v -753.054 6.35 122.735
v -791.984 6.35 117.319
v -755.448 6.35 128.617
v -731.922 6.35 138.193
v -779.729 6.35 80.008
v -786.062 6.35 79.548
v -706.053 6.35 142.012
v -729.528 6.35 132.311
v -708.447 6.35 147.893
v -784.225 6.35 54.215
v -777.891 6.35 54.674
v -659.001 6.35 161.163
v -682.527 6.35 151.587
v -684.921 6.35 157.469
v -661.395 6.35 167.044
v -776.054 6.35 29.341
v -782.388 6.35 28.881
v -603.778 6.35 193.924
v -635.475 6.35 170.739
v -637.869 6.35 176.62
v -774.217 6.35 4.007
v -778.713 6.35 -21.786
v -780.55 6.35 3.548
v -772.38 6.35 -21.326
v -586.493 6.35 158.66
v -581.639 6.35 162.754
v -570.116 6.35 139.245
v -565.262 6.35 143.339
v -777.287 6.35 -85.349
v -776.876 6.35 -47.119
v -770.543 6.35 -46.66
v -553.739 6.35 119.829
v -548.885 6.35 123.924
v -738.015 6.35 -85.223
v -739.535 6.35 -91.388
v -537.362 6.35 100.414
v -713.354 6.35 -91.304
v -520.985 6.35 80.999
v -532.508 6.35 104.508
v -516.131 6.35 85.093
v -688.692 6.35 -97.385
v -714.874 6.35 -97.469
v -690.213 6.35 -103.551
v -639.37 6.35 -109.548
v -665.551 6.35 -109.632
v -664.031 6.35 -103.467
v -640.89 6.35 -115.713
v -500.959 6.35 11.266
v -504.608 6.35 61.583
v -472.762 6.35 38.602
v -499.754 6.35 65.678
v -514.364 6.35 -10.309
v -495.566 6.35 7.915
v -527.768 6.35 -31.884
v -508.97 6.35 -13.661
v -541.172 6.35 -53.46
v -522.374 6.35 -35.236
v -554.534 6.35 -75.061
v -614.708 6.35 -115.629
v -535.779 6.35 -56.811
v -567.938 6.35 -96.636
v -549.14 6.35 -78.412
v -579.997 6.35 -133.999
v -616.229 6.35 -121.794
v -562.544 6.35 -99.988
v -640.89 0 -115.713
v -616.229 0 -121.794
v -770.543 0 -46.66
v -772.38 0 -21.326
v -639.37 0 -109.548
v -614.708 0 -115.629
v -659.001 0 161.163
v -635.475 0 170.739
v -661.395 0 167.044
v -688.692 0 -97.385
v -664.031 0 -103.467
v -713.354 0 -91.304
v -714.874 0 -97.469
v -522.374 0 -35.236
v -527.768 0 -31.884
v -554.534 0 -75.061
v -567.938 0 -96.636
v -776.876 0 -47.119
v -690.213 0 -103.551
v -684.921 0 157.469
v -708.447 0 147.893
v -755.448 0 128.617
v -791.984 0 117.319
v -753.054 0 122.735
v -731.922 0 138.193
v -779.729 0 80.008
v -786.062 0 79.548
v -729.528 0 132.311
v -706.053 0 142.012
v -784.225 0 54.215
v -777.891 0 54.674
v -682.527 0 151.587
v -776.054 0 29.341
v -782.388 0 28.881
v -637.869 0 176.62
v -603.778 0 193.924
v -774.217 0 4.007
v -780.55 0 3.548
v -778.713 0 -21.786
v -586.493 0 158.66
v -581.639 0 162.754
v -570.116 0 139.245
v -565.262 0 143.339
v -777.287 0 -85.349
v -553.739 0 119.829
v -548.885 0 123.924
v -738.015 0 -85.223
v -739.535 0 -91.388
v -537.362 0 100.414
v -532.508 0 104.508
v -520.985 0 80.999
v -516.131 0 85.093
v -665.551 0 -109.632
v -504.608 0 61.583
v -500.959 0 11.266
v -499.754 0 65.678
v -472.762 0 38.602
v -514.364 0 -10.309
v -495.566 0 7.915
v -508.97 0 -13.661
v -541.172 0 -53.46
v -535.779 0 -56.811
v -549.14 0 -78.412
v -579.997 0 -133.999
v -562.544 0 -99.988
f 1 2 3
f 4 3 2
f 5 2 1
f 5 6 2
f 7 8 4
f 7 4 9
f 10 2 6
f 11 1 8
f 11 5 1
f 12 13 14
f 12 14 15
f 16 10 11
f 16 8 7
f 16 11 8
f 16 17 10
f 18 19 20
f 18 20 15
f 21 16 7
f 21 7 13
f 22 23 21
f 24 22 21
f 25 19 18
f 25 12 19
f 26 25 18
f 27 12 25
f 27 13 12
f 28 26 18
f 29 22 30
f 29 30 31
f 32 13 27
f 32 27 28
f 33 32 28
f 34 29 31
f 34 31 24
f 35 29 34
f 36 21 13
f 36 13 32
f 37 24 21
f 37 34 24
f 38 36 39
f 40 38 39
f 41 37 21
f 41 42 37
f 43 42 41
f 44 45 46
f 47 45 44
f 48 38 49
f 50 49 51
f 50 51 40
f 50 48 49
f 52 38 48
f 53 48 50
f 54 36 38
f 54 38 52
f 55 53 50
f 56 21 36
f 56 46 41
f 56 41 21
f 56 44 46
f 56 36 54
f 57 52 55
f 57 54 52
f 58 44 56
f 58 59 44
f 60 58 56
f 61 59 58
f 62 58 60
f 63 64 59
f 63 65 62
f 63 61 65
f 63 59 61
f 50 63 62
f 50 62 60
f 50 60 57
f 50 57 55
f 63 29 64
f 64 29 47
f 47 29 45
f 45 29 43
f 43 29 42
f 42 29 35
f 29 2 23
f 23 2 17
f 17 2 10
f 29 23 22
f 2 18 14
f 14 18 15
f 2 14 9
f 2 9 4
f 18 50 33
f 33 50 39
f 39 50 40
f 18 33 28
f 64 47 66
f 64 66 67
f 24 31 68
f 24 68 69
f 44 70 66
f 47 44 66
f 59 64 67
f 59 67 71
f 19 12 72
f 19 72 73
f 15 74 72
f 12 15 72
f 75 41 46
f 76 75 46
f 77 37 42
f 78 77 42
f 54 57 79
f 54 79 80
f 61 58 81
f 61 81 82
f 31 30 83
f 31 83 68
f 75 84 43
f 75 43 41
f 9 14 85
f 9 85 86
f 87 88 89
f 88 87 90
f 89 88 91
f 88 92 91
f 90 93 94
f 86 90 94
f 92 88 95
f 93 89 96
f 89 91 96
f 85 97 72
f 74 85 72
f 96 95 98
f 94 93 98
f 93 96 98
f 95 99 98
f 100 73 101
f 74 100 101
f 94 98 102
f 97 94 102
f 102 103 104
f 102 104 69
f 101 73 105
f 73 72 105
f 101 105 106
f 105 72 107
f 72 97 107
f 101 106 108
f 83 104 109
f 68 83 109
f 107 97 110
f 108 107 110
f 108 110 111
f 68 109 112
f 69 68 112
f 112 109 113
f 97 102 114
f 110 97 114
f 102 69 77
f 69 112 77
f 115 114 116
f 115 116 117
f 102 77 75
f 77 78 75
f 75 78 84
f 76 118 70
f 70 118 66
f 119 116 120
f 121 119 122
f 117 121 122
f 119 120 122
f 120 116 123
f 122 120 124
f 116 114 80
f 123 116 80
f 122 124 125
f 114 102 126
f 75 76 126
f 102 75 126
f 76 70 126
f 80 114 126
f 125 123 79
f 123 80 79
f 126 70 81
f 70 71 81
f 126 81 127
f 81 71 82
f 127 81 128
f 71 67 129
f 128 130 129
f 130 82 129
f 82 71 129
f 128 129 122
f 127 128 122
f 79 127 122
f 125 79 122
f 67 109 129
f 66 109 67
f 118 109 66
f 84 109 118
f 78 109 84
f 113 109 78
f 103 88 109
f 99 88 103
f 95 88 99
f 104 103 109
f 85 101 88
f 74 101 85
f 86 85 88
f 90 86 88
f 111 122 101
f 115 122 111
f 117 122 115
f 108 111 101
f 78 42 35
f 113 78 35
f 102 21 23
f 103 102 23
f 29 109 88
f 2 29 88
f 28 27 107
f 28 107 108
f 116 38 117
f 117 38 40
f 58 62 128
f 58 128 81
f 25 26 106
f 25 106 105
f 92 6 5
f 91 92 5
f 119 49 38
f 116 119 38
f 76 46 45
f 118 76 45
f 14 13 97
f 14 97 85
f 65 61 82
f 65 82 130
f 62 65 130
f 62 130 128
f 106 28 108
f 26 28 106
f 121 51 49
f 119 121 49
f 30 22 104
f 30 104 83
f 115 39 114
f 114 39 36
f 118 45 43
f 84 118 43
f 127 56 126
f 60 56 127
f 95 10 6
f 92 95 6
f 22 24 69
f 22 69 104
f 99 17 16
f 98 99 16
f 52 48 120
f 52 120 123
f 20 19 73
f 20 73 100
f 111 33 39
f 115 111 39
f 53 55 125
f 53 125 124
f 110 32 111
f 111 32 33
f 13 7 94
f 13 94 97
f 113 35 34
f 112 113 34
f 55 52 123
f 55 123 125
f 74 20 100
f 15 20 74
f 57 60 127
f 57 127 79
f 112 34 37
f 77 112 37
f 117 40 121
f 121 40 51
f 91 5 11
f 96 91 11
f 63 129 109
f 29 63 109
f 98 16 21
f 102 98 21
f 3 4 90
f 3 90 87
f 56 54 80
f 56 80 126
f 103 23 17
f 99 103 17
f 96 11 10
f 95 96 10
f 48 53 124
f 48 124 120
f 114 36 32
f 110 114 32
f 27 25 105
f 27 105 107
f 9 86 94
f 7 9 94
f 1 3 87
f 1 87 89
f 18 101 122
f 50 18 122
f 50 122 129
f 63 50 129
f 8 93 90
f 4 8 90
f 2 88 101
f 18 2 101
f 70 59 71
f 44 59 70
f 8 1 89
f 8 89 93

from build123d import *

# Parameters (mm, degrees)
BOSS_EXTRUDE1_DEPTH = 6.35
CUT_EXTRUDE1_DEPTH  = 7.35
CUT_EXTRUDE2_DEPTH  = 7.35
CUT_EXTRUDE3_DEPTH  = 7.35
CUT_EXTRUDE4_DEPTH  = 7.35
CUT_EXTRUDE5_DEPTH  = 7.35


with BuildPart() as part:
    # Sketch1 → Boss-Extrude1 (new body)
    with BuildSketch(Plane(origin=(0, 0, 0), x_dir=(1, 0, 0), z_dir=(0, 1, 0))):
        Polygon((-472.762098838, -38.601599313), (-579.996957803, 133.998878735), (-777.287160977, 85.348948297), (-791.984353221, -117.318840313), (-603.777514393, -193.924491661), align=None)
    extrude(amount=BOSS_EXTRUDE1_DEPTH)

    # Sketch2 → Cut-Extrude1 (cut, through all)
    with BuildSketch(Plane(origin=(0, 6.35, 0), x_dir=(1, 0, 0), z_dir=(0, 1, 0))):
        Polygon((-659.001261619, -161.163030045), (-635.475406766, -170.738736463), (-637.86933337, -176.620200176), (-661.395188224, -167.044493758), align=None)
        Polygon((-706.052971326, -142.011617208), (-682.527116473, -151.587323626), (-684.921043077, -157.46878734), (-708.446897931, -147.893080921), align=None)
        Polygon((-753.053854552, -122.735332494), (-729.527999698, -132.311038913), (-731.921926303, -138.192502626), (-755.447781156, -128.616796208), align=None)
    extrude(amount=-CUT_EXTRUDE1_DEPTH, mode=Mode.SUBTRACT)

    # Sketch4 → Cut-Extrude2 (cut, through all)
    with BuildSketch(Plane(origin=(0, 6.35, 0), x_dir=(1, 0, 0), z_dir=(0, 1, 0))):
        Polygon((-570.115957611, -139.244740198), (-565.262117225, -143.338971934), (-581.639044169, -162.754333478), (-586.492884555, -158.660101741), align=None)
        Polygon((-520.985176778, -80.998655568), (-516.131336392, -85.092887304), (-499.754409447, -65.677525761), (-504.608249833, -61.583294024), align=None)
        Polygon((-548.88519028, -123.923610391), (-532.508263336, -104.508248847), (-537.362103722, -100.414017111), (-553.739030666, -119.829378655), align=None)
    extrude(amount=-CUT_EXTRUDE2_DEPTH, mode=Mode.SUBTRACT)

    # Sketch5 → Cut-Extrude3 (cut, through all)
    with BuildSketch(Plane(origin=(0, 6.35, 0), x_dir=(1, 0, 0), z_dir=(0, 1, 0))):
        Polygon((-777.891428053, -54.674087259), (-784.224796447, -54.214800001), (-786.061945478, -79.548273578), (-779.728577084, -80.007560835), align=None)
        Polygon((-774.217129992, -4.007140106), (-780.550498387, -3.547852849), (-782.387647417, -28.881326425), (-776.054279023, -29.340613683), align=None)
        Polygon((-776.876200326, 47.119094304), (-770.542831932, 46.659807046), (-772.379980962, 21.32633347), (-778.713349356, 21.785620727), align=None)
    extrude(amount=-CUT_EXTRUDE3_DEPTH, mode=Mode.SUBTRACT)

    # Sketch6 → Cut-Extrude4 (cut, through all)
    with BuildSketch(Plane(origin=(0, 6.35, 0), x_dir=(1, 0, 0), z_dir=(0, 1, 0))):
        Polygon((-508.969874734, 13.660505405), (-495.565517364, -7.914554351), (-500.959282303, -11.265643693), (-514.363639673, 10.309416063), align=None)
        Polygon((-522.374232105, 35.235565162), (-527.767997044, 31.884475819), (-541.172354415, 53.459535575), (-535.778589476, 56.810624918), align=None)
        Polygon((-549.139796727, 78.412493389), (-554.533561666, 75.061404046), (-567.937919036, 96.636463802), (-562.544154097, 99.987553145), align=None)
    extrude(amount=-CUT_EXTRUDE4_DEPTH, mode=Mode.SUBTRACT)

    # Sketch7 → Cut-Extrude5 (cut, through all)
    with BuildSketch(Plane(origin=(0, 6.35, 0), x_dir=(1, 0, 0), z_dir=(0, 1, 0))):
        Polygon((-614.708405409, 115.629038504), (-639.369680806, 109.5477972), (-640.889991132, 115.713116049), (-616.228715735, 121.794357354), align=None)
        Polygon((-665.551266529, 109.631874744), (-690.212541925, 103.550633439), (-688.692231599, 97.38531459), (-664.030956203, 103.466555895), align=None)
        Polygon((-714.873817322, 97.469392134), (-739.535092719, 91.38815083), (-738.014782393, 85.22283198), (-713.353506996, 91.304073285), align=None)
    extrude(amount=-CUT_EXTRUDE5_DEPTH, mode=Mode.SUBTRACT)


solid = part.part
